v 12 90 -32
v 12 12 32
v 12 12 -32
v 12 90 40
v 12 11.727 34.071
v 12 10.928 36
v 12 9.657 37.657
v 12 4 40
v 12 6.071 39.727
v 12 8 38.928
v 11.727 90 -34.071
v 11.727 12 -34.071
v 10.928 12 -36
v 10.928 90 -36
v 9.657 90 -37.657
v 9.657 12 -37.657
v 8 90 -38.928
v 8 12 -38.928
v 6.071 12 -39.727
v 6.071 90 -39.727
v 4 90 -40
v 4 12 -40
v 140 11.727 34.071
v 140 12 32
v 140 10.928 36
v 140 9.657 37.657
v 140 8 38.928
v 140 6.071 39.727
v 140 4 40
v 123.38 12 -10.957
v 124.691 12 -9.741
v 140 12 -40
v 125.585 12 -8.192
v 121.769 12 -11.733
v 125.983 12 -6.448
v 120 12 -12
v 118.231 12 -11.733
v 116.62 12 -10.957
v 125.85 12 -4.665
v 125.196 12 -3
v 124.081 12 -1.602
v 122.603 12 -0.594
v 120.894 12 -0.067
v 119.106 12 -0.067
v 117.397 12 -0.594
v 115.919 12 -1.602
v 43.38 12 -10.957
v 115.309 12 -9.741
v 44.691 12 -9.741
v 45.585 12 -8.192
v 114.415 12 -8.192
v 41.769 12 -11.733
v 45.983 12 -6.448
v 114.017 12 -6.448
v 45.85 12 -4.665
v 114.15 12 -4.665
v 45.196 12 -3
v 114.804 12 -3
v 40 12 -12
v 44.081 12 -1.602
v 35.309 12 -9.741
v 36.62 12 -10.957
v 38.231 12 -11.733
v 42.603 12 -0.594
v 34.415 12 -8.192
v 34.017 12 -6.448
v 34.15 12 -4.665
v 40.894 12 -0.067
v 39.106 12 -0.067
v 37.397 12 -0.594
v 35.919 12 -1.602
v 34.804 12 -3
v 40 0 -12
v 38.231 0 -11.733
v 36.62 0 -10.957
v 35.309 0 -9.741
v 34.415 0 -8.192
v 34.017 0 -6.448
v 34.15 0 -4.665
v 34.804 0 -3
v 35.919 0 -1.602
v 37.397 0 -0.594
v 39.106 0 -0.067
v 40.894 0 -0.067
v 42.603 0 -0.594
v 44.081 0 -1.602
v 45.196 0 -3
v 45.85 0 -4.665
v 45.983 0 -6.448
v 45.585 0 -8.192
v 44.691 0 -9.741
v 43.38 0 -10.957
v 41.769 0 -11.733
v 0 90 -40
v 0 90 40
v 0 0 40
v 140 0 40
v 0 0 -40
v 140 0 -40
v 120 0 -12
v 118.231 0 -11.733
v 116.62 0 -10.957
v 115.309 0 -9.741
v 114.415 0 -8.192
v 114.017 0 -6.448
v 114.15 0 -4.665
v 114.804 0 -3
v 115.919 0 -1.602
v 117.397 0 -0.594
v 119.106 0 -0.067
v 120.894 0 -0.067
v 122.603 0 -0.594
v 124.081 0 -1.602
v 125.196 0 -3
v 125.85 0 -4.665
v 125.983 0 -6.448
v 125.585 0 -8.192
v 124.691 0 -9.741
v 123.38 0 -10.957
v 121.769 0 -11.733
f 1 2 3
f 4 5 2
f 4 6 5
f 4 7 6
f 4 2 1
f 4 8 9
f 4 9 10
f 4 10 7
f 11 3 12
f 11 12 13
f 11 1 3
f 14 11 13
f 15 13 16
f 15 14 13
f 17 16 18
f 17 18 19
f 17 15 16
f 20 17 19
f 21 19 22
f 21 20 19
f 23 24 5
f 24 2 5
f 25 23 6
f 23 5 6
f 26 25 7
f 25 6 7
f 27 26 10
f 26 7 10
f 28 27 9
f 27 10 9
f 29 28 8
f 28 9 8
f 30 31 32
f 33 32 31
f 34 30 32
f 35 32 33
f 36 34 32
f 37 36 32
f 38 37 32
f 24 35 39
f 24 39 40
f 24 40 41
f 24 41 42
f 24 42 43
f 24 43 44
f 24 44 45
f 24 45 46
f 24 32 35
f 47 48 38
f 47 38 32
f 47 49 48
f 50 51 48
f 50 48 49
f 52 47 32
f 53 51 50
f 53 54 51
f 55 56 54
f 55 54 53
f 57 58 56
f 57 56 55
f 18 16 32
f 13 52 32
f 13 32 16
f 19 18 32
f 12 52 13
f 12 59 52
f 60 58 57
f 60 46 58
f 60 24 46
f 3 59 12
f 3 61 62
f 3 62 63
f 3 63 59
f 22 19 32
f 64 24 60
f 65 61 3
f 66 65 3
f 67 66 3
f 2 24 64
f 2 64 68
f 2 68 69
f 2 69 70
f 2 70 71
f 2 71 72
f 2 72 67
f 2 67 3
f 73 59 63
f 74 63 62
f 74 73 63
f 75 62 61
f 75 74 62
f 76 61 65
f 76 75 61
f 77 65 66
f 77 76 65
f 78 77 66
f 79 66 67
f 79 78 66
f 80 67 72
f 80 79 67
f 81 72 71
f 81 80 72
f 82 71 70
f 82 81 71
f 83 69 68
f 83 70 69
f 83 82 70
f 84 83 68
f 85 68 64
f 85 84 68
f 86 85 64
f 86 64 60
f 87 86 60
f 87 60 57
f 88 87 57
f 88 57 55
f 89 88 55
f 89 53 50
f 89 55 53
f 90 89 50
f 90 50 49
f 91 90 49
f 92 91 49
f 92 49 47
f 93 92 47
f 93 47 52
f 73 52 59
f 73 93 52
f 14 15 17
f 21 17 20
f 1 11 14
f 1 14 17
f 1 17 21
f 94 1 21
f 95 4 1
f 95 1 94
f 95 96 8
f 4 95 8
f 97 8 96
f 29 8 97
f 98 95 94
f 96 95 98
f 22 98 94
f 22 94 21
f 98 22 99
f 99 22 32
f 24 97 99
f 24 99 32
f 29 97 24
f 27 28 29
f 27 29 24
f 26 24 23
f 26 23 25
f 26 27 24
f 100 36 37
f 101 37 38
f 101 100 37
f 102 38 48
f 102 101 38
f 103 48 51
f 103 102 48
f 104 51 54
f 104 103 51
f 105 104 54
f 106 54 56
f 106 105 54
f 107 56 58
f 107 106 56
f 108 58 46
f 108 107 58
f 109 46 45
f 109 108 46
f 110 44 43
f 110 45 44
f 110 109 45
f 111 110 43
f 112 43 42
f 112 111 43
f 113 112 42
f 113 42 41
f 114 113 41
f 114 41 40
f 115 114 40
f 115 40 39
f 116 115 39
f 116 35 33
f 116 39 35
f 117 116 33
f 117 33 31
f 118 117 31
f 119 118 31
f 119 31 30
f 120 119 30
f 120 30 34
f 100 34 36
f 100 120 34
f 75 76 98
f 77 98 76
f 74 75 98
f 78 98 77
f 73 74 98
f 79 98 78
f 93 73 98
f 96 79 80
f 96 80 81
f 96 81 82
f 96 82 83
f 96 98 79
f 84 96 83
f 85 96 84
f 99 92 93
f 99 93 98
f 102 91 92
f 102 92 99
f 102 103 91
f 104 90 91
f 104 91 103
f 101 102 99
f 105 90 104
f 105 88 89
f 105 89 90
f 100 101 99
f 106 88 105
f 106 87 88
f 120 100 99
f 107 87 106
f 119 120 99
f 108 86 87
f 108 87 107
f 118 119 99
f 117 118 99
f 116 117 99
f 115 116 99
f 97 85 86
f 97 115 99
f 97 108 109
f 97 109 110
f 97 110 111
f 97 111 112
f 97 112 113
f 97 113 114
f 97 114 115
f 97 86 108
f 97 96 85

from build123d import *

# Parameters (mm, degrees)
EXTRUDE_1_DEPTH      = 40
FILLET_1_R           = 8
SKETCH_9_R           = 6
CUT_EXTRUDE_7_DEPTH  = 172.172427686
SKETCH_10_R          = 6
CUT_EXTRUDE_14_DEPTH = 172.172427686


with BuildPart() as part:
    # 草图8 → 凸台-拉伸1 (new, symmetric)
    with BuildSketch(Plane.XY):
        Polygon((0, 0), (140, 0), (140, 12), (12, 12), (12, 90), (0, 90), align=None)
    extrude(amount=EXTRUDE_1_DEPTH, both=True)

    # 圆角1
    fillet_1_edges = [part.edges().sort_by_distance(p)[0] for p in [
        (76, 12, 40),
        (12, 51, -40),
    ]]
    fillet(fillet_1_edges, radius=FILLET_1_R)

    # 草图9 → 切除-拉伸7 (cut, through all)
    with BuildSketch(Plane(origin=(0, 0, 0), x_dir=(1, 0, 0), z_dir=(0, 1, 0))):
        with Locations(Location((40, 6, 0), (0, 0, 90))):
            Circle(SKETCH_9_R)
    extrude(amount=CUT_EXTRUDE_7_DEPTH, mode=Mode.SUBTRACT)

    # 草图10 → 切除-拉伸14 (cut, through all)
    with BuildSketch(Plane(origin=(0, 0, 0), x_dir=(1, 0, 0), z_dir=(0, 1, 0))):
        with Locations(Location((120, 6, 0), (0, 0, 90))):
            Circle(SKETCH_10_R)
    extrude(amount=CUT_EXTRUDE_14_DEPTH, mode=Mode.SUBTRACT)


solid = part.part
